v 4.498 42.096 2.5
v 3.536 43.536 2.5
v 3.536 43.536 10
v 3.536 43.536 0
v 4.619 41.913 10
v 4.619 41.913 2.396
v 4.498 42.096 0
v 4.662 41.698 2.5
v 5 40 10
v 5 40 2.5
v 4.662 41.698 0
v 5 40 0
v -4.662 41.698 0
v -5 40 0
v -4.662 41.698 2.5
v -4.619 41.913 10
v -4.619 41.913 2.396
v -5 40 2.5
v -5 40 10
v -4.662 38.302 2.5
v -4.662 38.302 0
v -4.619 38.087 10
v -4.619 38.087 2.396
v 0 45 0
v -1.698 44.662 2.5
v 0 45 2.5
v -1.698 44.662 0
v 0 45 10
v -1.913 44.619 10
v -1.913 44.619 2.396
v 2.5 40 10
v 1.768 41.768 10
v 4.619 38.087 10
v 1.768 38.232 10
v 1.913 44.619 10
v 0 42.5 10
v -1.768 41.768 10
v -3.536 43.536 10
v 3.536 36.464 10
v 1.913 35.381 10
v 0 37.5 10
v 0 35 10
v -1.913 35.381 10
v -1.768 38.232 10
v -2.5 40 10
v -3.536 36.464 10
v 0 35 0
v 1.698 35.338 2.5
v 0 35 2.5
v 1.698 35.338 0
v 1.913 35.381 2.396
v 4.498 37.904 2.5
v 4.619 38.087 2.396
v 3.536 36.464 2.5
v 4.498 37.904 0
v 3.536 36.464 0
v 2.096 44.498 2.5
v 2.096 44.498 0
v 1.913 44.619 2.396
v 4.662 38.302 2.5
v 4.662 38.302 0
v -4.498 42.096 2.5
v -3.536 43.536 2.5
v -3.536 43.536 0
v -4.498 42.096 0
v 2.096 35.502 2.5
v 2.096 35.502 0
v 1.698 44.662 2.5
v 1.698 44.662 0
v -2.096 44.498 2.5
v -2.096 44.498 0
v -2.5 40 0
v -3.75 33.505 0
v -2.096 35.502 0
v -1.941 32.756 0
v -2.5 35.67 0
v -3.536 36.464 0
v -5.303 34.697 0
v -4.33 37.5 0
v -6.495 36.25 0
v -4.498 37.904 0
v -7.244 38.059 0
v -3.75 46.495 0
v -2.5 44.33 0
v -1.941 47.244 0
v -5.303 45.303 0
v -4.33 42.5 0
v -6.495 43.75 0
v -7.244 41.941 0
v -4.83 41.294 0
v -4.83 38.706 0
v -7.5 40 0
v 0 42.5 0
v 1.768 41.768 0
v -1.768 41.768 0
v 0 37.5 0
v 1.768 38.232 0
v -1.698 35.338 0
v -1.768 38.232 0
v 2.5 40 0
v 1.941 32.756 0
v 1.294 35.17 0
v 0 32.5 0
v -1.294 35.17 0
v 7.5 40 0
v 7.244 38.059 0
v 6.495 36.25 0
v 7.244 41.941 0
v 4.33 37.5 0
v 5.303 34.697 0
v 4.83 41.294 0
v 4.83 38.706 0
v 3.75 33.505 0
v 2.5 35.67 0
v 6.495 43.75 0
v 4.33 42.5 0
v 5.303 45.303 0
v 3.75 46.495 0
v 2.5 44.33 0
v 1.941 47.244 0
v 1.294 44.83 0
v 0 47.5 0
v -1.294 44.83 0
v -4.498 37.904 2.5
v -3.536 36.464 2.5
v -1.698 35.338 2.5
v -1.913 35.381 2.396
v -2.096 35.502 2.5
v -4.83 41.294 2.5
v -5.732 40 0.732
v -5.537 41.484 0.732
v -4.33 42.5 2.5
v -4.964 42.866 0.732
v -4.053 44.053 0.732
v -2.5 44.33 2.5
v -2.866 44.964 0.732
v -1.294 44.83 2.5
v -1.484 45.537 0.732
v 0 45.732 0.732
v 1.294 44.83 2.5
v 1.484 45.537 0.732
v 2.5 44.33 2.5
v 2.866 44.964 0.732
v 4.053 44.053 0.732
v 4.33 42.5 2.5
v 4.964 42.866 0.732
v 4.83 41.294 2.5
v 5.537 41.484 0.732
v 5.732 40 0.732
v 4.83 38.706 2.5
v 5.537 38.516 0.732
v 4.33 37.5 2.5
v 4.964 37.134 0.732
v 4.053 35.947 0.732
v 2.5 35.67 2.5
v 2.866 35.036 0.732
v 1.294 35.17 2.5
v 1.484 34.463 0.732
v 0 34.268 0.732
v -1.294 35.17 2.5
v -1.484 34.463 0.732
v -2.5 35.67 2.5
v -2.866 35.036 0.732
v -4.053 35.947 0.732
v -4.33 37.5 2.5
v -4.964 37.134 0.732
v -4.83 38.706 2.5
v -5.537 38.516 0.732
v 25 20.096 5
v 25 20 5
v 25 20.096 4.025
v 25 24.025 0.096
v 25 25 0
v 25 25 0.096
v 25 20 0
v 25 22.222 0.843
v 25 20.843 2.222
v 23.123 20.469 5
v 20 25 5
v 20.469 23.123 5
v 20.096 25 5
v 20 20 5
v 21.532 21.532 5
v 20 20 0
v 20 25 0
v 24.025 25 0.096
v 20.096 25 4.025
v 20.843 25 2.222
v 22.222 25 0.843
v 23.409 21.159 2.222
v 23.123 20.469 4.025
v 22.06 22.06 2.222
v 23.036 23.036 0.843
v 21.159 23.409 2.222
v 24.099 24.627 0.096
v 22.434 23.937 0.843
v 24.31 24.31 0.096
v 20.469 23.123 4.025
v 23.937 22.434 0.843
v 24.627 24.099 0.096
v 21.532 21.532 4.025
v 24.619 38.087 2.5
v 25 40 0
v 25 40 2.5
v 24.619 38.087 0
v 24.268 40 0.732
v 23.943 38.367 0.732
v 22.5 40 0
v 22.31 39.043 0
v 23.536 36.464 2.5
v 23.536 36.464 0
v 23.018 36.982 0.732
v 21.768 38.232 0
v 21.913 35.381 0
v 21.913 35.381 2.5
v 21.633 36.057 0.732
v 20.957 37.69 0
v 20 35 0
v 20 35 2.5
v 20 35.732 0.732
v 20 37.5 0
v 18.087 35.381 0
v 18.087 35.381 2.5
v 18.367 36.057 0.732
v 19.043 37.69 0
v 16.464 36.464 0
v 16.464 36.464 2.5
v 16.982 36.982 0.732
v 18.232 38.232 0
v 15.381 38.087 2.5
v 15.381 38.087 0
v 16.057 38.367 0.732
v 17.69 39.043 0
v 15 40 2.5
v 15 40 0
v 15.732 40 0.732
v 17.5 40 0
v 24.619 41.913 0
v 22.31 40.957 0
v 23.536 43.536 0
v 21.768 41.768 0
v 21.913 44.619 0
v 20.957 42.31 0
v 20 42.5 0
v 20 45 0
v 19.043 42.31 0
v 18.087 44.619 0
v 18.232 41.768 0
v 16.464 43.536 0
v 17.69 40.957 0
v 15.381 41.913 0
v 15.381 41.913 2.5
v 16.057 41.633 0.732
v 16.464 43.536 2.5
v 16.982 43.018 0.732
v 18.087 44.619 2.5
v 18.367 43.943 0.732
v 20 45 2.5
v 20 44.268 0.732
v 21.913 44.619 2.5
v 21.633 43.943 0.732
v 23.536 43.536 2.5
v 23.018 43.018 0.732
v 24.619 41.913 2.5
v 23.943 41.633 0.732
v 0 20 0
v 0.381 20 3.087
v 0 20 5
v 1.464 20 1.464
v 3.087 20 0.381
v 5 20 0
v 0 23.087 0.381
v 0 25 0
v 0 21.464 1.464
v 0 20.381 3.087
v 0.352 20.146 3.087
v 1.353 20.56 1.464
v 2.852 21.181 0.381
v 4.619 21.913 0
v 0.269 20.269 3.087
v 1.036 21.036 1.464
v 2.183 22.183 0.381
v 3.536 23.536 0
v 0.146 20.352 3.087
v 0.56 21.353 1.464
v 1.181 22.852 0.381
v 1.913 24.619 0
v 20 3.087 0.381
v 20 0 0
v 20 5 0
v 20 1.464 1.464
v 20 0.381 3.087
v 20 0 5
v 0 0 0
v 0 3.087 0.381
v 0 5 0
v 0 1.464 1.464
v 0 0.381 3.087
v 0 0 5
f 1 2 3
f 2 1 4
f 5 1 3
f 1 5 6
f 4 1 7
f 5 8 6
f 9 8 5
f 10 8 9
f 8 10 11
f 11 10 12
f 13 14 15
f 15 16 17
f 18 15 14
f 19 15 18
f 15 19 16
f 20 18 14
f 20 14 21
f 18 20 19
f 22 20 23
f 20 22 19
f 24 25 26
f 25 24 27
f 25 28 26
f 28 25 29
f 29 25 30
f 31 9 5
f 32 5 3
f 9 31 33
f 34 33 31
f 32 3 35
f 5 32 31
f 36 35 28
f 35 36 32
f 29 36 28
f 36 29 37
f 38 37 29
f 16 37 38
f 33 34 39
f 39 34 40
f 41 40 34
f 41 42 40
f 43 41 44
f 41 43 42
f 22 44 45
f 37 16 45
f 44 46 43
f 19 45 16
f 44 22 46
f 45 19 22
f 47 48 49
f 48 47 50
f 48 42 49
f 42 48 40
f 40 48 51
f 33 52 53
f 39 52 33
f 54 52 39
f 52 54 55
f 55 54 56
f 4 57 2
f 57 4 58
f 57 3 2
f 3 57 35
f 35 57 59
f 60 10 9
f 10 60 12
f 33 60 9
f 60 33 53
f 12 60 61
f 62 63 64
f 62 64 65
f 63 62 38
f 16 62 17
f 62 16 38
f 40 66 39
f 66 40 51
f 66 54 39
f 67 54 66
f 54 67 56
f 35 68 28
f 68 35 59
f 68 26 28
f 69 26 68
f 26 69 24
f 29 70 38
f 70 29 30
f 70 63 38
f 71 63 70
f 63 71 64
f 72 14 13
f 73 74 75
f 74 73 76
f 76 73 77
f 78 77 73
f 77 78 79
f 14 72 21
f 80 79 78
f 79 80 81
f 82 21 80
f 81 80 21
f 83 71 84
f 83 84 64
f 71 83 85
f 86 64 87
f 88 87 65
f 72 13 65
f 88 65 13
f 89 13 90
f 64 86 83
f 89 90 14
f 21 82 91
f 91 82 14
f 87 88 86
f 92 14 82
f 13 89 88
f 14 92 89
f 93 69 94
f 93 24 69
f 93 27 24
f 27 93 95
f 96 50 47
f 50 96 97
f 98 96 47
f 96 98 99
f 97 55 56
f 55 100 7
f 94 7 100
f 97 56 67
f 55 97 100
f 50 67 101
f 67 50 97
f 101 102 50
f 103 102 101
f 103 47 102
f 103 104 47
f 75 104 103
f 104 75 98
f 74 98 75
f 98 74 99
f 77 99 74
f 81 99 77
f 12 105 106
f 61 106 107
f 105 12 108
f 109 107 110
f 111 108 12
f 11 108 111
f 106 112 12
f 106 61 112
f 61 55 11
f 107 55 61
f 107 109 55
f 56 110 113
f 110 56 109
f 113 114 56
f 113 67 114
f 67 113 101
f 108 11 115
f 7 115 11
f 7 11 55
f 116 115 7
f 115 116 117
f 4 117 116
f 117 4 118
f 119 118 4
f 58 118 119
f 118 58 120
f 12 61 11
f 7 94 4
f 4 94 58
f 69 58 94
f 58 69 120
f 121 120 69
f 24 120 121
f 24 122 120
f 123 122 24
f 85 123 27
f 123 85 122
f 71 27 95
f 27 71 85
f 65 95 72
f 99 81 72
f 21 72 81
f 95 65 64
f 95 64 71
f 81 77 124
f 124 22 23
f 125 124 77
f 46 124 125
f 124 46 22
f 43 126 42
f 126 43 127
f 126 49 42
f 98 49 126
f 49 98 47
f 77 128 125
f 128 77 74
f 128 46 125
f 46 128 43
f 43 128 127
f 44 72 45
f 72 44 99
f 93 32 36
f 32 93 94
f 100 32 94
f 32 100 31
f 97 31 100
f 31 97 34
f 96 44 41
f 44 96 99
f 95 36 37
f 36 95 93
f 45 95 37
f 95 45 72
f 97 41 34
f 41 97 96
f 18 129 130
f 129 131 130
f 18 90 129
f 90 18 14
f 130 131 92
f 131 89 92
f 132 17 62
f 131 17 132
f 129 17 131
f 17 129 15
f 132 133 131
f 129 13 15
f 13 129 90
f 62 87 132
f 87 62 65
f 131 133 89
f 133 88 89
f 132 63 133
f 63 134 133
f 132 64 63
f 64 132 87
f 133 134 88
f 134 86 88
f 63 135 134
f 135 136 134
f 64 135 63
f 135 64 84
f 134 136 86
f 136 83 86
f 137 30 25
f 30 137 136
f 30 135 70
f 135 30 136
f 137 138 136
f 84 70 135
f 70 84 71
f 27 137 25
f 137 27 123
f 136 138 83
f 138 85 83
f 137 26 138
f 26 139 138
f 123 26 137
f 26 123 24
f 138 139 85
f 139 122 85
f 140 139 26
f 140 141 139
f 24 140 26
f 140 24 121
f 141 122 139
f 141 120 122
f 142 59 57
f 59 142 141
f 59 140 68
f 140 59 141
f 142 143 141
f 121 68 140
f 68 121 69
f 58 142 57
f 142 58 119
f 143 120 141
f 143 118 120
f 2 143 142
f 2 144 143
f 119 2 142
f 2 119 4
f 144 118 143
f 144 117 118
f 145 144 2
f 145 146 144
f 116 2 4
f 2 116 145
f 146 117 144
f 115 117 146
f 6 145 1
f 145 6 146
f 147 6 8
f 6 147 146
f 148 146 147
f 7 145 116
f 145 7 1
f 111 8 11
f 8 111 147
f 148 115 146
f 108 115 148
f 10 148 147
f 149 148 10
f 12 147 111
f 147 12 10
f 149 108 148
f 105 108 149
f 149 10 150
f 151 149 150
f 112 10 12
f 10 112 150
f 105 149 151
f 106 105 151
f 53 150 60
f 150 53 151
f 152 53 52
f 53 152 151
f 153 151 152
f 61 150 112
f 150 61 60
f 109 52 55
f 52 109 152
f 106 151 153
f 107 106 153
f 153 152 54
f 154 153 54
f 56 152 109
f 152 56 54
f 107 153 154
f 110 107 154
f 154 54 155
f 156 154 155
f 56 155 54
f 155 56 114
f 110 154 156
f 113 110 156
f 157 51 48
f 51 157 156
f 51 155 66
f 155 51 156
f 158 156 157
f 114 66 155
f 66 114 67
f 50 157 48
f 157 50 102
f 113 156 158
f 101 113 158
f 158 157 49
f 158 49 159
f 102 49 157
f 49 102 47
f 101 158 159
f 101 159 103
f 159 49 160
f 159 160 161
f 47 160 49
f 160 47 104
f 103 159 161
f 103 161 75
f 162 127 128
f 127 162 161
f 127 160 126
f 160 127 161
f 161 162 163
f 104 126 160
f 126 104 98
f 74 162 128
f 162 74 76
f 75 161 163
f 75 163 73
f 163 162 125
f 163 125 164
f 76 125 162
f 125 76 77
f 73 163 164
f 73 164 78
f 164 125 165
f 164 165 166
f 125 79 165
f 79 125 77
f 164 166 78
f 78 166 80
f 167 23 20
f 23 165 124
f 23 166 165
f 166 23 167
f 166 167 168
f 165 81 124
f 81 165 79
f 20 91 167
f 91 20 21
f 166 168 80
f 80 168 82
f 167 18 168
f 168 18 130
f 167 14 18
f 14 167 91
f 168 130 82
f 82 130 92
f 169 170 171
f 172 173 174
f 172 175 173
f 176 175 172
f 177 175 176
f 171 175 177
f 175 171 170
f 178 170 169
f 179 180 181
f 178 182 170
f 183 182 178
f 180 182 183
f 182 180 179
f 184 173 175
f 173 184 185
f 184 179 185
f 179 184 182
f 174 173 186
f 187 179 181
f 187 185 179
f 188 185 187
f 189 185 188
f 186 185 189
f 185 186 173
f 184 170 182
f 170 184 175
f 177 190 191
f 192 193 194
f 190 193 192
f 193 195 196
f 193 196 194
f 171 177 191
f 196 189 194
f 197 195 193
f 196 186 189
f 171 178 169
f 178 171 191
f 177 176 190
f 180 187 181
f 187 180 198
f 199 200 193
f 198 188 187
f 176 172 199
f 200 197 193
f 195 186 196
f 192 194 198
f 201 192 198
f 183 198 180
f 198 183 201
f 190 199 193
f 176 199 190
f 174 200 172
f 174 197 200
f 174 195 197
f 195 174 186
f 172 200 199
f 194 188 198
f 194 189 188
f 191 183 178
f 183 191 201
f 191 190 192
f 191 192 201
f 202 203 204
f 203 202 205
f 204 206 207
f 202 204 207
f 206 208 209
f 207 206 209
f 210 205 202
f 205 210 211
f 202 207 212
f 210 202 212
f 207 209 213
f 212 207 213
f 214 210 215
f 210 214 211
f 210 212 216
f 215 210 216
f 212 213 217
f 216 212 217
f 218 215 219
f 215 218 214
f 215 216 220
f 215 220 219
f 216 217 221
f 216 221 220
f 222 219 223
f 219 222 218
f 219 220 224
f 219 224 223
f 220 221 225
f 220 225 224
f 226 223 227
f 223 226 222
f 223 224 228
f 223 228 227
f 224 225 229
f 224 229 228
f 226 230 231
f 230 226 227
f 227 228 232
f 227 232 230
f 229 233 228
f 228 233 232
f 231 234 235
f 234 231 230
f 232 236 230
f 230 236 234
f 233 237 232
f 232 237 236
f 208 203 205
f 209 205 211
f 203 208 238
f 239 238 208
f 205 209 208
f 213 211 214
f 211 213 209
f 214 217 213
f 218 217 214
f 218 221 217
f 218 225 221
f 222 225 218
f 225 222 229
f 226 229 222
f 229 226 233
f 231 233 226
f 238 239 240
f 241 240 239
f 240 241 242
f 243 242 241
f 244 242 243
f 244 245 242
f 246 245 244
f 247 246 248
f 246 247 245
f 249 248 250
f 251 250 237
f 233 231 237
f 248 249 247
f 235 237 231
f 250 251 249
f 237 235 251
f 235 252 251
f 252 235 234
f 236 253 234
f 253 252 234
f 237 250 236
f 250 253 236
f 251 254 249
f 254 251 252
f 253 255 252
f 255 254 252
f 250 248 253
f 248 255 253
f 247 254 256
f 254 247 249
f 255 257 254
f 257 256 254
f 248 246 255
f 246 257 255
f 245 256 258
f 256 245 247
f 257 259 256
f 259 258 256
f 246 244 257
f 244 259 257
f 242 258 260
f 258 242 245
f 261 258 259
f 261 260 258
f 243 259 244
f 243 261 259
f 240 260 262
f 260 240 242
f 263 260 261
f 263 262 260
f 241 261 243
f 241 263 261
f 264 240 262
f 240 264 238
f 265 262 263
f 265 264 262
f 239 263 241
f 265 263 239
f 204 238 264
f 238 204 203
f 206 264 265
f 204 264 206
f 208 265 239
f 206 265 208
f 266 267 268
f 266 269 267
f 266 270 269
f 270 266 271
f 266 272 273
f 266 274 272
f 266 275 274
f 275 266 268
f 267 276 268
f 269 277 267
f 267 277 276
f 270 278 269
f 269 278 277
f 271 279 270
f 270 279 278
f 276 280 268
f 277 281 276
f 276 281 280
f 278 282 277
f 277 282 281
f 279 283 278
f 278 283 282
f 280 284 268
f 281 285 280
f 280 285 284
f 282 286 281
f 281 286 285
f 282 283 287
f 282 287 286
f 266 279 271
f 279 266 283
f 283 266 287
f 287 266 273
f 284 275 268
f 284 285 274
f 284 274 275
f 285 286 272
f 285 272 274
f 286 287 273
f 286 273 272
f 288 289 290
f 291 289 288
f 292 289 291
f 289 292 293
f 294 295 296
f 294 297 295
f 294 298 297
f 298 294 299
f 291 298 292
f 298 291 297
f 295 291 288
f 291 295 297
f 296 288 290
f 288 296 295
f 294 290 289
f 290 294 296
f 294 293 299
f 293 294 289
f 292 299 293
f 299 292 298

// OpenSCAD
/* fillets.scad
 * Contains modules for a variety of fillets.
 *   round_fillet()
 *   straight_fillet()
 *   corner_fillet()
 *   inside_corner_fillet()
 *   
 * Created: 16 Aug 2019
 * Edited: 16 Aug 2019
 * Author: Ray Depew
 */

// $fn = 50;

// Creates a circular fillet, whose base is centered at (0,0).
// r1 is the radius of the fillet.
// r2 is the radius of the cylinder.
// r2 is usually smaller than r1.
// If r2 is negative, draws an inside fillet.
// Optional theta draws only a pie-slice of the fillet.
module round_fillet(r1, r2, theta=360) {
  rotate_extrude(angle=theta, convexity = 10)
  translate([r2, 0, 0])
  intersection() {
    square(2*r1);
    difference() {
      square(2*r1, center=true);
      translate([r1, r1]) circle(r1);
    }
  }
}

// Draws a straight fillet.
// r is the fillet radius.
// l is the fillet length.
// The x-axis is the edge of the fillet,
// and the fillet opens to +x, +y.
// (0,0) is the center of the fillet.
module straight_fillet(r, l) {
  translate([l/2, 0, 0]) rotate([0,-90,0])
  linear_extrude(l) {
    intersection() {
      square(2*r);
      difference() {
        square(2*r, center=true);
        translate([r, r]) circle(r);
      }
    }
  }
}

// Draws a 90-degree segment of a fillet,
// for example on the corner of a cube.
// Fillet is drawn on the x-y plane.
// (0,0) is the the corner's edge.
module corner_fillet(r) {
  round_fillet(r, 0, 90);
}

// Draws a 90x90x90 degree fillet
// for the inside corner of a cube.
// (0,0,0) is the vertex of the corner.
// Fillet opens out to +x, +y, +z.
module inside_corner_fillet(r) {
  difference() {
    cube(r);
    translate([r,r,r]) sphere(r); }
}

// HINT: If you only want an inside corner fillet 
// on 2 edges, then use straight_fillet() on the two
// edges instead of using inside_corner_fillet().


/******** DEMO **********/

// This is for demo purposes only. If you use 'use' instead of
// 'include' to import fillet into your program, this part will be 
// discarded. It's like Python's 'if __name__ == __main__' thing.
translate([0,40,0]) {
  difference() {
    cylinder(r=5, h=10);
    translate([0,0,-1]) cylinder(r=2.5, h=12);
  }
  round_fillet(2.5, 5);
}

translate([20,40,0]) round_fillet(2.5, -5);
translate([0,20,0]) corner_fillet(5);
translate([20,20,0]) inside_corner_fillet(5);
translate([10,0,0]) straight_fillet(5,20);
